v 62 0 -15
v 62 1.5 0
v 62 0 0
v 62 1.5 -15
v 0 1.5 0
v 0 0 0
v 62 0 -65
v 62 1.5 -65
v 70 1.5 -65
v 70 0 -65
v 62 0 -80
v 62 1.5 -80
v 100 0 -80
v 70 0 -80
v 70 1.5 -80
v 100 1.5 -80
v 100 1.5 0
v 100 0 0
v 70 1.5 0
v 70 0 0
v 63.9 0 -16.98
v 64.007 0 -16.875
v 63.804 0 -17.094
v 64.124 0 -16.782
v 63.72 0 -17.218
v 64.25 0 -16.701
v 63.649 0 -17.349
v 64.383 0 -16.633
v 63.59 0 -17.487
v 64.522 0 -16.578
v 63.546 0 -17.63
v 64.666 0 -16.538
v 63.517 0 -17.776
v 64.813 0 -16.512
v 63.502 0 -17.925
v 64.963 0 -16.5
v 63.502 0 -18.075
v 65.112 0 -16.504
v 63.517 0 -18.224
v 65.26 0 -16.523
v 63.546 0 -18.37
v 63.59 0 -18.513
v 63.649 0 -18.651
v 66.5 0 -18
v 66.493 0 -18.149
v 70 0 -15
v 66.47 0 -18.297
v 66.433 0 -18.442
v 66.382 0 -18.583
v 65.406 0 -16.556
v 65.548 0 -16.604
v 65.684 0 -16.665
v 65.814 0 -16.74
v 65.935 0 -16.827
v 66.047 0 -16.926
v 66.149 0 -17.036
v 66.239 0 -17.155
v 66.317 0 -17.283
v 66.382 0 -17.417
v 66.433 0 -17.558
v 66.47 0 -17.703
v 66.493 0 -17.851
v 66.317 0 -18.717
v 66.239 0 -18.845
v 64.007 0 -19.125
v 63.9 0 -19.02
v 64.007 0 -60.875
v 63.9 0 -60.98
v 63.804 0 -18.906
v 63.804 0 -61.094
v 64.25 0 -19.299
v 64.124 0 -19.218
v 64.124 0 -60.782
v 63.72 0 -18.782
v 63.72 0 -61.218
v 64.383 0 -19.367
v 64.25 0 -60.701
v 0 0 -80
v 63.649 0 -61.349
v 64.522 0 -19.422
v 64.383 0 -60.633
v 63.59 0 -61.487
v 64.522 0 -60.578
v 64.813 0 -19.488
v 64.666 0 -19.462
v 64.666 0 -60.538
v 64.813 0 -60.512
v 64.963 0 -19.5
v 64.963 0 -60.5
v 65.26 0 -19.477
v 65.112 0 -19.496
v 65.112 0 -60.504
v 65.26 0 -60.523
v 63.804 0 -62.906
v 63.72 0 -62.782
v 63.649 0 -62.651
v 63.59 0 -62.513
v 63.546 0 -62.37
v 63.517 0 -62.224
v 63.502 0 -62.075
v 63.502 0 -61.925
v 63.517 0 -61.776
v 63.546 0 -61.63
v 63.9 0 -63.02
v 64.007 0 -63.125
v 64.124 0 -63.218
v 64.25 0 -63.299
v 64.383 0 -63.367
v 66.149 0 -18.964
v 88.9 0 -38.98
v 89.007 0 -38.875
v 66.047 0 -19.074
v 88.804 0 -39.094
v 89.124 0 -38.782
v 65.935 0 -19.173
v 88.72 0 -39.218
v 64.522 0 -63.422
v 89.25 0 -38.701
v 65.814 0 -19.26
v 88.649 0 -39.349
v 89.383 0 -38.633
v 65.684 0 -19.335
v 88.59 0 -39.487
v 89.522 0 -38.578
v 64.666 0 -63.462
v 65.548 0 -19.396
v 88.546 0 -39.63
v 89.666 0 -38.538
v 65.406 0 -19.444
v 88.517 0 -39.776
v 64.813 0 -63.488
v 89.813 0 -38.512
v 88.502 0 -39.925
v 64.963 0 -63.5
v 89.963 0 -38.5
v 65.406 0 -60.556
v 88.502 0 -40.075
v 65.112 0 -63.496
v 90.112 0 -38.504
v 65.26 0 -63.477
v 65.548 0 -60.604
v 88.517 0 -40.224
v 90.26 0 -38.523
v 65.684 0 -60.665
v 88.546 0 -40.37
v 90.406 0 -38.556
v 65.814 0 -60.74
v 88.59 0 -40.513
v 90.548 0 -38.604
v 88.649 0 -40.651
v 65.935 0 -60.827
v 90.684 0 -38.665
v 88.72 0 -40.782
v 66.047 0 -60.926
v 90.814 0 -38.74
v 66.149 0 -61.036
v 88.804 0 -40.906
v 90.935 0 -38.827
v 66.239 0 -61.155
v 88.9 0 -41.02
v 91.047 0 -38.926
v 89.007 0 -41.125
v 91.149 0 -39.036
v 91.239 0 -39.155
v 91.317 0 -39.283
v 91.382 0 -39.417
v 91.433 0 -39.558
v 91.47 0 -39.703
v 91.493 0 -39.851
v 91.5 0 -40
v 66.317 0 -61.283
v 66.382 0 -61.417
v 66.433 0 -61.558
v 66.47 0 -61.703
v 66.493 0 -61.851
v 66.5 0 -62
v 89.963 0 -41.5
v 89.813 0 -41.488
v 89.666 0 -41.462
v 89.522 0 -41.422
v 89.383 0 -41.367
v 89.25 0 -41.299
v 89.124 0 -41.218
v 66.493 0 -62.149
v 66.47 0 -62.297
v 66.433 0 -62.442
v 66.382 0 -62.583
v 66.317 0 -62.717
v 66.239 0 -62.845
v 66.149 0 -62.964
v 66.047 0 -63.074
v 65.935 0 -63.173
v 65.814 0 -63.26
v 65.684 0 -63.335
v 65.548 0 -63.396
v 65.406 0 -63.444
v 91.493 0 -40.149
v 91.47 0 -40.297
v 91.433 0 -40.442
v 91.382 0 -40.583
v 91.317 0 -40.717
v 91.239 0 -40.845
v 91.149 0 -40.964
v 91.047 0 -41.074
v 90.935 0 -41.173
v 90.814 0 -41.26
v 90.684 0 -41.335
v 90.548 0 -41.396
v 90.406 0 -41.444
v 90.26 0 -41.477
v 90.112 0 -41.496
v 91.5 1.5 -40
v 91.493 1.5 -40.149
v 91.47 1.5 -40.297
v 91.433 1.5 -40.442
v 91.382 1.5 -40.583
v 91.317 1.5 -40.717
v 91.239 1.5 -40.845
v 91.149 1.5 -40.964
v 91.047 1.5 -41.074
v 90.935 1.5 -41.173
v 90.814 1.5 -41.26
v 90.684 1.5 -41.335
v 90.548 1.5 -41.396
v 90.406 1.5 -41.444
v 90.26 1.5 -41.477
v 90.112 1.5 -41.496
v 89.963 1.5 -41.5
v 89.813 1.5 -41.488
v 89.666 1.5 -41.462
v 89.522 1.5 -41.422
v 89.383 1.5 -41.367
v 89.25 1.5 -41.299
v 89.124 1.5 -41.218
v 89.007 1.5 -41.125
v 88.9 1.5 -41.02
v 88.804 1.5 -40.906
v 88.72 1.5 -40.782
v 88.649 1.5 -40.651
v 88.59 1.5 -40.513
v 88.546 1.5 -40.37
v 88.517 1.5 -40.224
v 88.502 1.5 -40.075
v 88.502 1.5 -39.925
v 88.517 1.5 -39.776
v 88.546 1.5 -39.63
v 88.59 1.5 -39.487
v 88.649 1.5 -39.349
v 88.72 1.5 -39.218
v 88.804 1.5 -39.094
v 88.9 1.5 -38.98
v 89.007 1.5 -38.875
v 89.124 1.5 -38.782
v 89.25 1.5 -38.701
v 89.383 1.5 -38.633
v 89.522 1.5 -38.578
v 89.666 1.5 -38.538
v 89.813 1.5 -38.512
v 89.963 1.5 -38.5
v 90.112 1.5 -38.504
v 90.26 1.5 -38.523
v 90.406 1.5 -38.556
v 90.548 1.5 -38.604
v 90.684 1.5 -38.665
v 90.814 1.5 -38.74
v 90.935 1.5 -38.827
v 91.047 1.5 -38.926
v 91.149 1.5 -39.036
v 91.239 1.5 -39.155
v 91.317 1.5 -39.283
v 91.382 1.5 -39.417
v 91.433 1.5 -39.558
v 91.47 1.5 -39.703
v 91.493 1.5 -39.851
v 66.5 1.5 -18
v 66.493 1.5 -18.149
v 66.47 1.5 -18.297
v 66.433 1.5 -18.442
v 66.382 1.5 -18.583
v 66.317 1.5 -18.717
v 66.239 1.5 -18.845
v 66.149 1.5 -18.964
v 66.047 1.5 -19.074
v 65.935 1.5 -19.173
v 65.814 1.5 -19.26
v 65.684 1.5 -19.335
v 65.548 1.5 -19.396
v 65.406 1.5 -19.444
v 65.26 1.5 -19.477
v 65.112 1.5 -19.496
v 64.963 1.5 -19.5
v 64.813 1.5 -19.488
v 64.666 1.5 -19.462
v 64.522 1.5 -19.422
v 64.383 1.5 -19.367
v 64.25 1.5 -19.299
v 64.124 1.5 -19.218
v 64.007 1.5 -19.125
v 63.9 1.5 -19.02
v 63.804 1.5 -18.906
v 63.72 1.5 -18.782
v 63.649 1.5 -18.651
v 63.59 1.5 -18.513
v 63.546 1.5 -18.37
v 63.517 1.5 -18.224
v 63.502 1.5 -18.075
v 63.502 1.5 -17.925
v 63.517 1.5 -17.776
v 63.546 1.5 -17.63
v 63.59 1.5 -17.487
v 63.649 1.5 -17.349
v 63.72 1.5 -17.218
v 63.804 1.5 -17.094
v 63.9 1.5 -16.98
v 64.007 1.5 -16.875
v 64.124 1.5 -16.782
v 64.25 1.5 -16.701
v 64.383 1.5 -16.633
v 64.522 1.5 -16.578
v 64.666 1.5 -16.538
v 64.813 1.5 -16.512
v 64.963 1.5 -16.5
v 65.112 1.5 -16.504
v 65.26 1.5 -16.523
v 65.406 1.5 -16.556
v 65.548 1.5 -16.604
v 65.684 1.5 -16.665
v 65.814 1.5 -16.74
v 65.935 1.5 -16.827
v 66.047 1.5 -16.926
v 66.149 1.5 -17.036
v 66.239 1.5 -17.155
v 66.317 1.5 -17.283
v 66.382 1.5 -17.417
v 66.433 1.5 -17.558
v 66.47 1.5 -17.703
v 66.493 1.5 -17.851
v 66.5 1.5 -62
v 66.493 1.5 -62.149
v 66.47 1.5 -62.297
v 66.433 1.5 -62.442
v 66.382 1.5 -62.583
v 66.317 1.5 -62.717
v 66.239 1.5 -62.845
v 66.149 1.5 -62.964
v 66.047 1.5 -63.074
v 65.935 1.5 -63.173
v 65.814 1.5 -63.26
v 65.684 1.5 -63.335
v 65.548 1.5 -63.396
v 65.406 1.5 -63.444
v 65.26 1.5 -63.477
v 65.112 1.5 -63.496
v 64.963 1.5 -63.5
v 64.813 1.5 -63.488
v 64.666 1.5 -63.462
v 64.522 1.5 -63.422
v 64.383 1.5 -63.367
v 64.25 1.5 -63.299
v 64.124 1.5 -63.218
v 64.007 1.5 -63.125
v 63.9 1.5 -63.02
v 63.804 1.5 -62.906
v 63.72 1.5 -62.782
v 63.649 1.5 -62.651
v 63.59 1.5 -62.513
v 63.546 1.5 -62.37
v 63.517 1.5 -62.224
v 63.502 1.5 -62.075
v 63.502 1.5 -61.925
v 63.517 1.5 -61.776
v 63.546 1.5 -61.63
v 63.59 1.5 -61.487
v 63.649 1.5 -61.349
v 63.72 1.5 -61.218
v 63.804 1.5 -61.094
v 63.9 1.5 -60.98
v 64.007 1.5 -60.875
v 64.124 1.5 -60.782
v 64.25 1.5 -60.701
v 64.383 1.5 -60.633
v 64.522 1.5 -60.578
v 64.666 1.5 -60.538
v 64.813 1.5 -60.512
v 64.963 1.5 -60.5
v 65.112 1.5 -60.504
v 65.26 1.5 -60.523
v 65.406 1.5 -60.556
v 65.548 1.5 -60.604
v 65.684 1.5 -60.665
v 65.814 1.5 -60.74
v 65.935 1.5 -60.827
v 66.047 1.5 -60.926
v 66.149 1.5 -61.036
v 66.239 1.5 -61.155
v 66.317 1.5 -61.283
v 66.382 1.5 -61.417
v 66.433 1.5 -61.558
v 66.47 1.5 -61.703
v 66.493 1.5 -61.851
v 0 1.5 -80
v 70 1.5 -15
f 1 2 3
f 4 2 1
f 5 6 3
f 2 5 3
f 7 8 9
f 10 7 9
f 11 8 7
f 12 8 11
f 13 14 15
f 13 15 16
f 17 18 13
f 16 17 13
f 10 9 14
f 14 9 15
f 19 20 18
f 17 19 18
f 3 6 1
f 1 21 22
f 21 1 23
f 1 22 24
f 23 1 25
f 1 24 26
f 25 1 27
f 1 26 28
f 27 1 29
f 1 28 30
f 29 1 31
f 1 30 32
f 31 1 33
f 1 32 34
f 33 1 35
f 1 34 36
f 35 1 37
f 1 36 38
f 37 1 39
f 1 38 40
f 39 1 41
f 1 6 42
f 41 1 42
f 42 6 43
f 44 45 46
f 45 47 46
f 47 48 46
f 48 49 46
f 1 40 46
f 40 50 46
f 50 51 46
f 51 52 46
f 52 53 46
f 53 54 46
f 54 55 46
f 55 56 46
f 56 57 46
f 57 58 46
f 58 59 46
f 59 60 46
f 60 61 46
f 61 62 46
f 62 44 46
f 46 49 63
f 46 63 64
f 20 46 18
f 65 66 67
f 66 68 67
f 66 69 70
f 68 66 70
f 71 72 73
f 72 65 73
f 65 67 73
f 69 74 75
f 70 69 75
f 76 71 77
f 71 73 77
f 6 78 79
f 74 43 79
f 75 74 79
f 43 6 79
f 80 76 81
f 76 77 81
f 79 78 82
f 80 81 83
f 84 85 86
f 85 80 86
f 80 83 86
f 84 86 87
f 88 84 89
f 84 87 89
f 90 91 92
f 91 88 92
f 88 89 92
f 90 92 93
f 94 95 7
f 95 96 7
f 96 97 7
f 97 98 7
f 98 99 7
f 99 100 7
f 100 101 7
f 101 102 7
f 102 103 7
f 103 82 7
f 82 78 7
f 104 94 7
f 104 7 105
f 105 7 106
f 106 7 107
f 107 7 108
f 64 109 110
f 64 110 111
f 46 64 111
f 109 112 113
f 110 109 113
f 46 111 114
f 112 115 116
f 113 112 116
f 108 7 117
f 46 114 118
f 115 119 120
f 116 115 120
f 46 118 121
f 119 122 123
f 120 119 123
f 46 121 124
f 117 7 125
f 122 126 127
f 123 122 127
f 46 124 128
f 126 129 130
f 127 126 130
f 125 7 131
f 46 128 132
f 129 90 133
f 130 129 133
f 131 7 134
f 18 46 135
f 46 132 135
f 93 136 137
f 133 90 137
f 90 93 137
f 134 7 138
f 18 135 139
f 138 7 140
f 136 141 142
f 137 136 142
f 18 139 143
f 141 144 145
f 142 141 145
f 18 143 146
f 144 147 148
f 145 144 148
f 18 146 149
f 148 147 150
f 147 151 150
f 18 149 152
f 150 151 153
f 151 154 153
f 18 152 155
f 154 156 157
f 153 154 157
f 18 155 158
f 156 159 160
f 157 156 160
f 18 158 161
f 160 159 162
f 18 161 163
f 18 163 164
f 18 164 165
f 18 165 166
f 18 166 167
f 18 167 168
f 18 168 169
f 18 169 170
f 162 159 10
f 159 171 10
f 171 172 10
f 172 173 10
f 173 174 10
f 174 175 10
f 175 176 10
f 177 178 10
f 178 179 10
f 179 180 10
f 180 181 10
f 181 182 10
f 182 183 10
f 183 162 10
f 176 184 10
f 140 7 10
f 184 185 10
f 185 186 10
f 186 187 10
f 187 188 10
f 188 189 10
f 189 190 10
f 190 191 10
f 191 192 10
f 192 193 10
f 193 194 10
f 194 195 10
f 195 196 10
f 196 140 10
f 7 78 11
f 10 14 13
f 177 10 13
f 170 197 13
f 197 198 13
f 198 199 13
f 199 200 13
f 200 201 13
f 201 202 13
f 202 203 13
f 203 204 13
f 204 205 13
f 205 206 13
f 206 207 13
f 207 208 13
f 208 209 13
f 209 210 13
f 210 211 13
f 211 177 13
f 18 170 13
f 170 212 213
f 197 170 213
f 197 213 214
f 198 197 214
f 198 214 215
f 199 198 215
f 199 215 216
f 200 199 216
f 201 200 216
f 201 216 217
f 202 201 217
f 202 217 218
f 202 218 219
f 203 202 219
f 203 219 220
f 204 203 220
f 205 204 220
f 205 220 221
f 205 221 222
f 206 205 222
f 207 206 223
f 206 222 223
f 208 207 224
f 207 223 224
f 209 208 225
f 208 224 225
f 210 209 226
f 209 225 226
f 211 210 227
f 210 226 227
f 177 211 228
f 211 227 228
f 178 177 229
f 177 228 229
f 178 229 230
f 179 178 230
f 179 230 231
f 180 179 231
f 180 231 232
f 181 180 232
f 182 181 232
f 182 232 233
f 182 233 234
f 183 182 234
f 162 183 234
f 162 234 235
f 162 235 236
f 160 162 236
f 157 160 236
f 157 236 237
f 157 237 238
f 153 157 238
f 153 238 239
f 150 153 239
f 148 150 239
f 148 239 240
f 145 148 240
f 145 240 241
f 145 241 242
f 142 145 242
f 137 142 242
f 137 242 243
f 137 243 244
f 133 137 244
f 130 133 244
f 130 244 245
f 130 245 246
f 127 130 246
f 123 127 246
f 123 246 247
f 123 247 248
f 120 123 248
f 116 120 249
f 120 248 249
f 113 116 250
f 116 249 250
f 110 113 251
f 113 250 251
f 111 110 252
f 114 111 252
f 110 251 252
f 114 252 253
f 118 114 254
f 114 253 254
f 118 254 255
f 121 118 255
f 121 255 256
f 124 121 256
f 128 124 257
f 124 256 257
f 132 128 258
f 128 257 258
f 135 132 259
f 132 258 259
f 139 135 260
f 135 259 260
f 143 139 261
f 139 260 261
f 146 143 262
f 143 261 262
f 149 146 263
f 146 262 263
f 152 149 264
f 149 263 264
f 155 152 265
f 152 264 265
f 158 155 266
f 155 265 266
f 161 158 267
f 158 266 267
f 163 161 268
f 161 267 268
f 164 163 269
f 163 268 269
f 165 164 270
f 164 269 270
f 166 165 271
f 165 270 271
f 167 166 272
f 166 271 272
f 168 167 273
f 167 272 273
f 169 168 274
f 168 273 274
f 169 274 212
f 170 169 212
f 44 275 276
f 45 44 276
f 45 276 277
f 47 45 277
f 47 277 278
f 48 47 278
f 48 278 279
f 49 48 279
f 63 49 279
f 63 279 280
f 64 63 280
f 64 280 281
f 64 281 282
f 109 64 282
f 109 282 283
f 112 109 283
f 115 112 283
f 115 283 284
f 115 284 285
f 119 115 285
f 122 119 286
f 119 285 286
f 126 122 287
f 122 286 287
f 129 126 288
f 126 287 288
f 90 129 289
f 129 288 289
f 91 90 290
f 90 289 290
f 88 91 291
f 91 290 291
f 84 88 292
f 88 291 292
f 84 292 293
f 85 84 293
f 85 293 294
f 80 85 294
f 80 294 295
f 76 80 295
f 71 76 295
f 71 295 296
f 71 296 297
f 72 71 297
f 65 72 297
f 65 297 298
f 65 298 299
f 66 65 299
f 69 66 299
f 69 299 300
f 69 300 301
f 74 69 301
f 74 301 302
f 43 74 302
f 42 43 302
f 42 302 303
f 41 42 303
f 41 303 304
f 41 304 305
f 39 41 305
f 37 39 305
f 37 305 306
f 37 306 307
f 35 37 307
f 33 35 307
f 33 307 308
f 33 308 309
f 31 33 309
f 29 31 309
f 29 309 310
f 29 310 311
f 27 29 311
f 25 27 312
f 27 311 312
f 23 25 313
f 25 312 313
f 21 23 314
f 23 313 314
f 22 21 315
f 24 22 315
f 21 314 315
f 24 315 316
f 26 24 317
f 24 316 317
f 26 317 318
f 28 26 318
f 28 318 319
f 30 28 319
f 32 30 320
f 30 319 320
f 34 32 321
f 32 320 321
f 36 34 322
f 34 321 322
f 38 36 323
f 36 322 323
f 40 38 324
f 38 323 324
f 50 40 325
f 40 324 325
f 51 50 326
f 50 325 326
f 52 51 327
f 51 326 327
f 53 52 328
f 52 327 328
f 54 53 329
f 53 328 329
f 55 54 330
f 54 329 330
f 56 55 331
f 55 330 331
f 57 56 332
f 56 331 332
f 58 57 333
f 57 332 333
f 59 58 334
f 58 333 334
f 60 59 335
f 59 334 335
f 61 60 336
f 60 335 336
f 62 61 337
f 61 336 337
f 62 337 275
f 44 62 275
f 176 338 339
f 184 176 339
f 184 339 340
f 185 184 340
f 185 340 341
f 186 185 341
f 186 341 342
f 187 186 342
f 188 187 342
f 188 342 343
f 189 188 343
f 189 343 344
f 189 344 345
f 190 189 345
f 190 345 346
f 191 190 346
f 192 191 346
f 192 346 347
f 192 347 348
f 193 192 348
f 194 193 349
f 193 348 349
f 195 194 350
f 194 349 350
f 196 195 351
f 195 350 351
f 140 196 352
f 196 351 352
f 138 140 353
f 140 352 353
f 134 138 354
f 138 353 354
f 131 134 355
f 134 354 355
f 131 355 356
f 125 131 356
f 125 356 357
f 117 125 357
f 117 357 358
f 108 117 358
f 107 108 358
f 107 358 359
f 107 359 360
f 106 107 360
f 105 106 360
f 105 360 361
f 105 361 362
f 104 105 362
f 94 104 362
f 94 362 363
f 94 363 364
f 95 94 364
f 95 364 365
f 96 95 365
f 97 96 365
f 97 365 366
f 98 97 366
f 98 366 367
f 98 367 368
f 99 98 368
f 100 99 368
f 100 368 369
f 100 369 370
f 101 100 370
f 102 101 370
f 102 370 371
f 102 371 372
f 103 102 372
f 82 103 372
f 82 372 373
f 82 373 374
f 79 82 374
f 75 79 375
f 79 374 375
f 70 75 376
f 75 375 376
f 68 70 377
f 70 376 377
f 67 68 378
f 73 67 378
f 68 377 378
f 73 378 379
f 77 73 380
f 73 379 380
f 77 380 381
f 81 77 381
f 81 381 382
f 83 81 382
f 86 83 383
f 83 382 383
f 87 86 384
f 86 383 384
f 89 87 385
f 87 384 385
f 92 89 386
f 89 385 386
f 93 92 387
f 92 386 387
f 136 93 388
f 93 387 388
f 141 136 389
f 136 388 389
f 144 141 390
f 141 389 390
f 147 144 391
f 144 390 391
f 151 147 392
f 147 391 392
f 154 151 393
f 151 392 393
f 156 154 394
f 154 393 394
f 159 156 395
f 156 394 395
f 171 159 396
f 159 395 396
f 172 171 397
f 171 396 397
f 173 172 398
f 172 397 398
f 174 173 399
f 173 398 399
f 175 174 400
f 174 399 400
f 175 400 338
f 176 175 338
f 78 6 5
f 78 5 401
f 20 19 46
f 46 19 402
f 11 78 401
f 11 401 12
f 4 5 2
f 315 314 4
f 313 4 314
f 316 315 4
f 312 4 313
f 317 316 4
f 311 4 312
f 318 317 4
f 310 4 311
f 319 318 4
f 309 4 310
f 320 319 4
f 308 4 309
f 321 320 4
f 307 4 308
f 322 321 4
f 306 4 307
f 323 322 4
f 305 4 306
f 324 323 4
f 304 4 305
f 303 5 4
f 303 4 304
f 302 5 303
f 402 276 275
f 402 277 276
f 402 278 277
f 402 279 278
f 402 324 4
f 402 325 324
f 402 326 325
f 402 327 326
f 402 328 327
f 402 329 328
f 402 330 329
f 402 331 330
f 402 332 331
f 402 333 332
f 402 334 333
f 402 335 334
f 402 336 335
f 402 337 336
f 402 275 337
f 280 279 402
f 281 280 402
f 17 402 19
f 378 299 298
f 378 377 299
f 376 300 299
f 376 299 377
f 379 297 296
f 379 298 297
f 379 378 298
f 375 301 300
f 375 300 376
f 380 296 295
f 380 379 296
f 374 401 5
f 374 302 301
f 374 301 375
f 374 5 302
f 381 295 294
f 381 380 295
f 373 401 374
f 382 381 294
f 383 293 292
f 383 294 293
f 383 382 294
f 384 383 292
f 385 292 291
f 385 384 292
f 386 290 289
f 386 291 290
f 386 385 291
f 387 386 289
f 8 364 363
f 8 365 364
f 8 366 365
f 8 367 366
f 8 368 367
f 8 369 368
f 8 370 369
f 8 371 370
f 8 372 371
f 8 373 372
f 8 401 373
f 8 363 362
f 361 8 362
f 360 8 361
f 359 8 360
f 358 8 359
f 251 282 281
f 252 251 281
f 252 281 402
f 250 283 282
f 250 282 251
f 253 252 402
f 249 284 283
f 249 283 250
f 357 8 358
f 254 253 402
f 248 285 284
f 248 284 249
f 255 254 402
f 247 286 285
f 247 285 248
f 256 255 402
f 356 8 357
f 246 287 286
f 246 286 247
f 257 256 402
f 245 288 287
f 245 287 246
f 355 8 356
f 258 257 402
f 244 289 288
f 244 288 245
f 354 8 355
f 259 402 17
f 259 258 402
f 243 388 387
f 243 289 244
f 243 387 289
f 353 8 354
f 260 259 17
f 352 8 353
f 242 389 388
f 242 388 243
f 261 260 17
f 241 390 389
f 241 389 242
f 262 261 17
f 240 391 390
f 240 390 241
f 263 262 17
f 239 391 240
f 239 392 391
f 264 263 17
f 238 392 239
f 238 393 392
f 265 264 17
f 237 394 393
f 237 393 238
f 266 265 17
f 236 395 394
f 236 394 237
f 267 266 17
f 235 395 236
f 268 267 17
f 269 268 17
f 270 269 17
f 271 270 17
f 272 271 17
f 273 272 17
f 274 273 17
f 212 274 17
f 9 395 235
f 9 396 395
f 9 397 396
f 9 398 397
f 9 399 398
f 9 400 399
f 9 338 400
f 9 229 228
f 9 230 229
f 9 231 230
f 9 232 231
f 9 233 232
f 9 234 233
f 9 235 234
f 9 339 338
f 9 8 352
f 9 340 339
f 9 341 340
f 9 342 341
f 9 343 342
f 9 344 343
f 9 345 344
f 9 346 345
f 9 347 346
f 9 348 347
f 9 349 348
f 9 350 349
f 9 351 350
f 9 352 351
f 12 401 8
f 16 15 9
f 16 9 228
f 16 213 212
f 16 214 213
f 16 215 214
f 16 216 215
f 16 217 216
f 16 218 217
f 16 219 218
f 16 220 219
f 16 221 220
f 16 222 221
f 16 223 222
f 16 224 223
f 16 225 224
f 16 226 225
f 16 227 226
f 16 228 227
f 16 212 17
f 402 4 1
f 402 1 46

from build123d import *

# Parameters (mm, degrees)
SKETCH1_W           = 100
SKETCH1_H           = 80
BOSS_EXTRUDE1_DEPTH = 1.5
CUT_EXTRUDE1_REACH  = 3.5
SKETCH2_W           = 8
SKETCH2_H           = 15
CUT_EXTRUDE2_REACH  = 3.5
SKETCH3_R           = 1.5


with BuildPart() as part:
    # Sketch1 → Boss-Extrude1 (new body)
    with BuildSketch(Plane(origin=(0, 0, 0), x_dir=(1, 0, 0), z_dir=(0, 1, 0))):
        with Locations((50, 40)):
            Rectangle(SKETCH1_W, SKETCH1_H)
    extrude(amount=BOSS_EXTRUDE1_DEPTH)

    # Sketch2 → Cut-Extrude1 (cut, up to next)
    with BuildSketch(Plane(origin=(0, 1.5, 0), x_dir=(1, 0, 0), z_dir=(0, 1, 0)), mode=Mode.PRIVATE) as cut_extrude1_sk1:
        with Locations((66, 72.5)):
            Rectangle(SKETCH2_W, SKETCH2_H)
    cut_extrude1_tool1 = extrude(cut_extrude1_sk1.sketch, amount=-CUT_EXTRUDE1_REACH, mode=Mode.PRIVATE) & part.part
    add(cut_extrude1_tool1.solids().sort_by_distance((66, 1.5, -72.5))[0], mode=Mode.SUBTRACT)
    # Sketch2 → Cut-Extrude1 (cut, up to next)
    with BuildSketch(Plane(origin=(0, 1.5, 0), x_dir=(1, 0, 0), z_dir=(0, 1, 0)), mode=Mode.PRIVATE) as cut_extrude1_sk2:
        with Locations((66, 7.5)):
            Rectangle(SKETCH2_W, SKETCH2_H)
    cut_extrude1_tool2 = extrude(cut_extrude1_sk2.sketch, amount=-CUT_EXTRUDE1_REACH, mode=Mode.PRIVATE) & part.part
    add(cut_extrude1_tool2.solids().sort_by_distance((66, 1.5, -7.5))[0], mode=Mode.SUBTRACT)

    # Sketch3 → Cut-Extrude2 (cut, up to next)
    with BuildSketch(Plane(origin=(0, 1.5, 0), x_dir=(1, 0, 0), z_dir=(0, 1, 0)), mode=Mode.PRIVATE) as cut_extrude2_sk1:
        with Locations((65, 62)):
            Circle(SKETCH3_R)
    cut_extrude2_tool1 = extrude(cut_extrude2_sk1.sketch, amount=-CUT_EXTRUDE2_REACH, mode=Mode.PRIVATE) & part.part
    add(cut_extrude2_tool1.solids().sort_by_distance((65, 1.5, -62))[0], mode=Mode.SUBTRACT)
    # Sketch3 → Cut-Extrude2 (cut, up to next)
    with BuildSketch(Plane(origin=(0, 1.5, 0), x_dir=(1, 0, 0), z_dir=(0, 1, 0)), mode=Mode.PRIVATE) as cut_extrude2_sk2:
        with Locations((90, 40)):
            Circle(SKETCH3_R)
    cut_extrude2_tool2 = extrude(cut_extrude2_sk2.sketch, amount=-CUT_EXTRUDE2_REACH, mode=Mode.PRIVATE) & part.part
    add(cut_extrude2_tool2.solids().sort_by_distance((90, 1.5, -40))[0], mode=Mode.SUBTRACT)
    # Sketch3 → Cut-Extrude2 (cut, up to next)
    with BuildSketch(Plane(origin=(0, 1.5, 0), x_dir=(1, 0, 0), z_dir=(0, 1, 0)), mode=Mode.PRIVATE) as cut_extrude2_sk3:
        with Locations((65, 18)):
            Circle(SKETCH3_R)
    cut_extrude2_tool3 = extrude(cut_extrude2_sk3.sketch, amount=-CUT_EXTRUDE2_REACH, mode=Mode.PRIVATE) & part.part
    add(cut_extrude2_tool3.solids().sort_by_distance((65, 1.5, -18))[0], mode=Mode.SUBTRACT)


solid = part.part
